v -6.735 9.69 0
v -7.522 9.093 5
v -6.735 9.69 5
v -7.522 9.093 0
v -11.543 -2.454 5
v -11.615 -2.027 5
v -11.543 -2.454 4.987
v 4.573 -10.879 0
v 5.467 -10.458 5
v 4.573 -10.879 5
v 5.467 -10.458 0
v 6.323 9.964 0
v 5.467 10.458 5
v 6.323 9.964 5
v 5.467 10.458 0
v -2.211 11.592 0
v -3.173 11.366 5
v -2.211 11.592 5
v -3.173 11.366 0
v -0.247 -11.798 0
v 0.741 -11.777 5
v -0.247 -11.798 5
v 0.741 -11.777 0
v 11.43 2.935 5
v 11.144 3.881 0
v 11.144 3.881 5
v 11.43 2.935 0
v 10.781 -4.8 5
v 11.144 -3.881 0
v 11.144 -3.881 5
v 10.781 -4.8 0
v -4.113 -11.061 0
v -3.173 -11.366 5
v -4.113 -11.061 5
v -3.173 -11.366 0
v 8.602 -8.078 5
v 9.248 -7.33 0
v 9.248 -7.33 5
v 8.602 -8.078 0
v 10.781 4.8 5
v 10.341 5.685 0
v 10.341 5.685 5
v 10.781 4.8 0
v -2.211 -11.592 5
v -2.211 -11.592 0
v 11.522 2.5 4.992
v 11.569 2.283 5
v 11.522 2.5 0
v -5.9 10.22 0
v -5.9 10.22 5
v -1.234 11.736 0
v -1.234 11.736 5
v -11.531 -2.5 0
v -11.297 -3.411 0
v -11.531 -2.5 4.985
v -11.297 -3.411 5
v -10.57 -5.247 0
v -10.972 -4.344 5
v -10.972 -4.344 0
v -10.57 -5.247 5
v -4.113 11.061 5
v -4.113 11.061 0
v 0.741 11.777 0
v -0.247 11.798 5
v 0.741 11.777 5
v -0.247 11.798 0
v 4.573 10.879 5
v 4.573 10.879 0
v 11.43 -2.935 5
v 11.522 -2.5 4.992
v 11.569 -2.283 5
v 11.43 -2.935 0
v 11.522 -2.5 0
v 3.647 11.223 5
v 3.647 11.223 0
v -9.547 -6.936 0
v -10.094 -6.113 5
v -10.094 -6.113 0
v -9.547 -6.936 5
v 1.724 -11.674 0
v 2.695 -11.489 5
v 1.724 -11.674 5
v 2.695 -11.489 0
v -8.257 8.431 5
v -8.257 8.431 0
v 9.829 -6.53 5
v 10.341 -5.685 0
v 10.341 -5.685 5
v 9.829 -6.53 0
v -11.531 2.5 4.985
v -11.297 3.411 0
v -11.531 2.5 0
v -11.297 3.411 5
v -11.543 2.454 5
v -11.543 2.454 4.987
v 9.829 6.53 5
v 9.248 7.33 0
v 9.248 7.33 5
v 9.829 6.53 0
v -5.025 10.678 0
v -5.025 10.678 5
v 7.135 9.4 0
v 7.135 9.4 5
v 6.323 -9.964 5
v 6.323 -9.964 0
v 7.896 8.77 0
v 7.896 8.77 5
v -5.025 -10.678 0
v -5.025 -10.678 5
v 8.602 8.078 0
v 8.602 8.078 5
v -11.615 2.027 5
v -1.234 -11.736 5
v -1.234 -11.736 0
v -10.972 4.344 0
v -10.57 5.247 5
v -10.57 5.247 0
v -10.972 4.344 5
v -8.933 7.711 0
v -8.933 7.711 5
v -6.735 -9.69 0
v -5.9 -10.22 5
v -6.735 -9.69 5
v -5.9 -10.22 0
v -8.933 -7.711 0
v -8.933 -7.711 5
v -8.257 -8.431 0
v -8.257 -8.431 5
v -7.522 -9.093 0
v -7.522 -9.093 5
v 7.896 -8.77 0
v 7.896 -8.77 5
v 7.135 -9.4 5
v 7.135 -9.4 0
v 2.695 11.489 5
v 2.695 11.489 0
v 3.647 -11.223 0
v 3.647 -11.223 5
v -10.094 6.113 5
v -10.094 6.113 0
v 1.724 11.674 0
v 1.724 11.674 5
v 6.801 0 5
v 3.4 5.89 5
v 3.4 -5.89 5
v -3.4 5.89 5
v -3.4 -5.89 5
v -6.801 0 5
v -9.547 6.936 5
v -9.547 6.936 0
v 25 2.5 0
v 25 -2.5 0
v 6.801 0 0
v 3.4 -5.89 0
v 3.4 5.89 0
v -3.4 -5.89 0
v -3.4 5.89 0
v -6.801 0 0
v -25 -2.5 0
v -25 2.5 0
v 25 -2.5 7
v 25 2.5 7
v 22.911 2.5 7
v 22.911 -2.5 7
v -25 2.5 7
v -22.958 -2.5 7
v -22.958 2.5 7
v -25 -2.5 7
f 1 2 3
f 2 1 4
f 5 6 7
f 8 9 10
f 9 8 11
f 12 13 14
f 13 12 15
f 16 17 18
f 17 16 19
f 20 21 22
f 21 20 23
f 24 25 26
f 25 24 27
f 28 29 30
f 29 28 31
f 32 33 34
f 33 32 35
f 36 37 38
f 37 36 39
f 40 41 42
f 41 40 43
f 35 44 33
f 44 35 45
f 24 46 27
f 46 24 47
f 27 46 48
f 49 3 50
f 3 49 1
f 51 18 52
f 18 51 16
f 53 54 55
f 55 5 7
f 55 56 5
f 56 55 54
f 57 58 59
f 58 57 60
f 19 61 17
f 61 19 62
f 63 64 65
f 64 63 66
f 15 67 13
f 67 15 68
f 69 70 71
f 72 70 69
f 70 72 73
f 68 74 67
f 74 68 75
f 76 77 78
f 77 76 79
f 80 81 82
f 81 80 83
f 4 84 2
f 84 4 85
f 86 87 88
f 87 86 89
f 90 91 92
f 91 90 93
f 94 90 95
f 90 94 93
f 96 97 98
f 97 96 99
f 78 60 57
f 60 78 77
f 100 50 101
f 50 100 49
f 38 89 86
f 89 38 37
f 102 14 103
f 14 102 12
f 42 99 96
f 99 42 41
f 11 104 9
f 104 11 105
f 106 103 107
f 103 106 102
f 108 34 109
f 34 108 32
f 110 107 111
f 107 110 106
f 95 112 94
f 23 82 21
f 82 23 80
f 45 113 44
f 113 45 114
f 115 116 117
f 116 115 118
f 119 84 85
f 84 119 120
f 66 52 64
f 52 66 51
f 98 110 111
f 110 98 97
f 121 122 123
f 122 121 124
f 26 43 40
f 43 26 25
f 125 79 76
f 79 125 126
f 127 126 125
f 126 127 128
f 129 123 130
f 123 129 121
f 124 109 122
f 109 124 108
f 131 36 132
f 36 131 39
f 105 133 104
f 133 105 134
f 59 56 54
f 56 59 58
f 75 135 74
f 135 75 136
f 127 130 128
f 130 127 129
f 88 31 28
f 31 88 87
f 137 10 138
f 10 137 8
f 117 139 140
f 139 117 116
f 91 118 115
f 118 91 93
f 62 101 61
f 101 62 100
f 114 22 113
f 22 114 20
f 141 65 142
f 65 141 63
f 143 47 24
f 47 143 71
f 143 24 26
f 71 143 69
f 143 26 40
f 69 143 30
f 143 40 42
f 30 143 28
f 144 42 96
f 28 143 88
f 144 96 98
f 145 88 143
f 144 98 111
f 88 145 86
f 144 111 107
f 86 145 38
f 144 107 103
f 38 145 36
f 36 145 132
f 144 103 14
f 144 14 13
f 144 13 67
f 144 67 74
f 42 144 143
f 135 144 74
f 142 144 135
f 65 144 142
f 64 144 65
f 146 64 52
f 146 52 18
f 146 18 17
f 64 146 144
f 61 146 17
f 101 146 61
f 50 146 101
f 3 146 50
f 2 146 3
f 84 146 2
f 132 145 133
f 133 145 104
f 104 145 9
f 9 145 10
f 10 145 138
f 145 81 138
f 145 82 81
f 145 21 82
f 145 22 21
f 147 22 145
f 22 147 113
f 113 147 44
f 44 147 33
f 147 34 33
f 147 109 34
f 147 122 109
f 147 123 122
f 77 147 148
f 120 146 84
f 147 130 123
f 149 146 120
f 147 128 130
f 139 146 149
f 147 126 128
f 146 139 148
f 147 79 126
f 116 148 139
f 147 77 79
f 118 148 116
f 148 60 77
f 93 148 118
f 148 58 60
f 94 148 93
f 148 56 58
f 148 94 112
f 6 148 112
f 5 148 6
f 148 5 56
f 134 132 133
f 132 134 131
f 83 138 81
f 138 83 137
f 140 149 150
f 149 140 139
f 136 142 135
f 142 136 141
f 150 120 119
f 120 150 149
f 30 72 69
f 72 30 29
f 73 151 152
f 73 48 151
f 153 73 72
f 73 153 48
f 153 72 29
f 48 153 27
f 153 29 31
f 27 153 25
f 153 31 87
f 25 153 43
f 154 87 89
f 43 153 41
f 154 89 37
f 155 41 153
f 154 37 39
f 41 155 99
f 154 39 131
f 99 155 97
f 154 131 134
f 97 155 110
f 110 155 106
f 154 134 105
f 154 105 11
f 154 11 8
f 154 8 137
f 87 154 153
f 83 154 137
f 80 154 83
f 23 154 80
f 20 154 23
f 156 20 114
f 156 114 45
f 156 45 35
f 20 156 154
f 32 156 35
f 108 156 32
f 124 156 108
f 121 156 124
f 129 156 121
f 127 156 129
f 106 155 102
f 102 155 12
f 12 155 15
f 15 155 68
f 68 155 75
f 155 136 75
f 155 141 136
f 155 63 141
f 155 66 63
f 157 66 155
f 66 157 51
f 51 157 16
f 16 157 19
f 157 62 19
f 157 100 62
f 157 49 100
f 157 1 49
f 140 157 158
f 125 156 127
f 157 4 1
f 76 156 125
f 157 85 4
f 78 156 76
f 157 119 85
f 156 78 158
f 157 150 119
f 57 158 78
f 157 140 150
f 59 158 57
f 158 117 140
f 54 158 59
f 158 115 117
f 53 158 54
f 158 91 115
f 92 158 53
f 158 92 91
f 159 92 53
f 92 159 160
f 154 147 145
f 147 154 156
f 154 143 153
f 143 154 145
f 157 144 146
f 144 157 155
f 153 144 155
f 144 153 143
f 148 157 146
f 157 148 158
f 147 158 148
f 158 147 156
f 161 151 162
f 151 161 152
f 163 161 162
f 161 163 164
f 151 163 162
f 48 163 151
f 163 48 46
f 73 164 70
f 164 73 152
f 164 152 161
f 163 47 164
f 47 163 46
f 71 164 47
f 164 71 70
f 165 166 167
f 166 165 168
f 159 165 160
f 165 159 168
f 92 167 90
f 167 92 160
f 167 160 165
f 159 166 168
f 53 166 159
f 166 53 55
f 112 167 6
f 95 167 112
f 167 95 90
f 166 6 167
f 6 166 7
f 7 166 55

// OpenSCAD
/*
 * Simple key-spanner for tightening retaining bolt.
 */

$fa = 1;
$fs = 1;

// Needs to be at least 2 for a very snug fit, and higher to give some leeway
Fudge = 6;
Wall = 5;

in = 25.4;
Depth = 5;
Width = 7/16*in;
Diameter = Width / cos(30);
R = Diameter * (1 + Fudge/100) / 2;

// Nut holder
difference() {
  cylinder(r=R+Wall, h=Depth);
  cylinder(r=R, h=Depth, $fn=6);
}

// Wings
translate([0,-1*Wall/2,0]){
    intersection(){
        cube([25,Wall,7]);
        translate([10,0,-3.4]){
            rotate(a=-10, v=[0,1,0]){
                cube([25,Wall, 8]);
            }
        }
    }
    translate([-25, 0, 0]) {
        intersection(){
                cube([25,Wall, 7]);
                translate([-10,0,1]){
                rotate(a=10, v=[0,1,0]){
                  cube([25, Wall, 8]);
                }
            }
        }
    }
}
